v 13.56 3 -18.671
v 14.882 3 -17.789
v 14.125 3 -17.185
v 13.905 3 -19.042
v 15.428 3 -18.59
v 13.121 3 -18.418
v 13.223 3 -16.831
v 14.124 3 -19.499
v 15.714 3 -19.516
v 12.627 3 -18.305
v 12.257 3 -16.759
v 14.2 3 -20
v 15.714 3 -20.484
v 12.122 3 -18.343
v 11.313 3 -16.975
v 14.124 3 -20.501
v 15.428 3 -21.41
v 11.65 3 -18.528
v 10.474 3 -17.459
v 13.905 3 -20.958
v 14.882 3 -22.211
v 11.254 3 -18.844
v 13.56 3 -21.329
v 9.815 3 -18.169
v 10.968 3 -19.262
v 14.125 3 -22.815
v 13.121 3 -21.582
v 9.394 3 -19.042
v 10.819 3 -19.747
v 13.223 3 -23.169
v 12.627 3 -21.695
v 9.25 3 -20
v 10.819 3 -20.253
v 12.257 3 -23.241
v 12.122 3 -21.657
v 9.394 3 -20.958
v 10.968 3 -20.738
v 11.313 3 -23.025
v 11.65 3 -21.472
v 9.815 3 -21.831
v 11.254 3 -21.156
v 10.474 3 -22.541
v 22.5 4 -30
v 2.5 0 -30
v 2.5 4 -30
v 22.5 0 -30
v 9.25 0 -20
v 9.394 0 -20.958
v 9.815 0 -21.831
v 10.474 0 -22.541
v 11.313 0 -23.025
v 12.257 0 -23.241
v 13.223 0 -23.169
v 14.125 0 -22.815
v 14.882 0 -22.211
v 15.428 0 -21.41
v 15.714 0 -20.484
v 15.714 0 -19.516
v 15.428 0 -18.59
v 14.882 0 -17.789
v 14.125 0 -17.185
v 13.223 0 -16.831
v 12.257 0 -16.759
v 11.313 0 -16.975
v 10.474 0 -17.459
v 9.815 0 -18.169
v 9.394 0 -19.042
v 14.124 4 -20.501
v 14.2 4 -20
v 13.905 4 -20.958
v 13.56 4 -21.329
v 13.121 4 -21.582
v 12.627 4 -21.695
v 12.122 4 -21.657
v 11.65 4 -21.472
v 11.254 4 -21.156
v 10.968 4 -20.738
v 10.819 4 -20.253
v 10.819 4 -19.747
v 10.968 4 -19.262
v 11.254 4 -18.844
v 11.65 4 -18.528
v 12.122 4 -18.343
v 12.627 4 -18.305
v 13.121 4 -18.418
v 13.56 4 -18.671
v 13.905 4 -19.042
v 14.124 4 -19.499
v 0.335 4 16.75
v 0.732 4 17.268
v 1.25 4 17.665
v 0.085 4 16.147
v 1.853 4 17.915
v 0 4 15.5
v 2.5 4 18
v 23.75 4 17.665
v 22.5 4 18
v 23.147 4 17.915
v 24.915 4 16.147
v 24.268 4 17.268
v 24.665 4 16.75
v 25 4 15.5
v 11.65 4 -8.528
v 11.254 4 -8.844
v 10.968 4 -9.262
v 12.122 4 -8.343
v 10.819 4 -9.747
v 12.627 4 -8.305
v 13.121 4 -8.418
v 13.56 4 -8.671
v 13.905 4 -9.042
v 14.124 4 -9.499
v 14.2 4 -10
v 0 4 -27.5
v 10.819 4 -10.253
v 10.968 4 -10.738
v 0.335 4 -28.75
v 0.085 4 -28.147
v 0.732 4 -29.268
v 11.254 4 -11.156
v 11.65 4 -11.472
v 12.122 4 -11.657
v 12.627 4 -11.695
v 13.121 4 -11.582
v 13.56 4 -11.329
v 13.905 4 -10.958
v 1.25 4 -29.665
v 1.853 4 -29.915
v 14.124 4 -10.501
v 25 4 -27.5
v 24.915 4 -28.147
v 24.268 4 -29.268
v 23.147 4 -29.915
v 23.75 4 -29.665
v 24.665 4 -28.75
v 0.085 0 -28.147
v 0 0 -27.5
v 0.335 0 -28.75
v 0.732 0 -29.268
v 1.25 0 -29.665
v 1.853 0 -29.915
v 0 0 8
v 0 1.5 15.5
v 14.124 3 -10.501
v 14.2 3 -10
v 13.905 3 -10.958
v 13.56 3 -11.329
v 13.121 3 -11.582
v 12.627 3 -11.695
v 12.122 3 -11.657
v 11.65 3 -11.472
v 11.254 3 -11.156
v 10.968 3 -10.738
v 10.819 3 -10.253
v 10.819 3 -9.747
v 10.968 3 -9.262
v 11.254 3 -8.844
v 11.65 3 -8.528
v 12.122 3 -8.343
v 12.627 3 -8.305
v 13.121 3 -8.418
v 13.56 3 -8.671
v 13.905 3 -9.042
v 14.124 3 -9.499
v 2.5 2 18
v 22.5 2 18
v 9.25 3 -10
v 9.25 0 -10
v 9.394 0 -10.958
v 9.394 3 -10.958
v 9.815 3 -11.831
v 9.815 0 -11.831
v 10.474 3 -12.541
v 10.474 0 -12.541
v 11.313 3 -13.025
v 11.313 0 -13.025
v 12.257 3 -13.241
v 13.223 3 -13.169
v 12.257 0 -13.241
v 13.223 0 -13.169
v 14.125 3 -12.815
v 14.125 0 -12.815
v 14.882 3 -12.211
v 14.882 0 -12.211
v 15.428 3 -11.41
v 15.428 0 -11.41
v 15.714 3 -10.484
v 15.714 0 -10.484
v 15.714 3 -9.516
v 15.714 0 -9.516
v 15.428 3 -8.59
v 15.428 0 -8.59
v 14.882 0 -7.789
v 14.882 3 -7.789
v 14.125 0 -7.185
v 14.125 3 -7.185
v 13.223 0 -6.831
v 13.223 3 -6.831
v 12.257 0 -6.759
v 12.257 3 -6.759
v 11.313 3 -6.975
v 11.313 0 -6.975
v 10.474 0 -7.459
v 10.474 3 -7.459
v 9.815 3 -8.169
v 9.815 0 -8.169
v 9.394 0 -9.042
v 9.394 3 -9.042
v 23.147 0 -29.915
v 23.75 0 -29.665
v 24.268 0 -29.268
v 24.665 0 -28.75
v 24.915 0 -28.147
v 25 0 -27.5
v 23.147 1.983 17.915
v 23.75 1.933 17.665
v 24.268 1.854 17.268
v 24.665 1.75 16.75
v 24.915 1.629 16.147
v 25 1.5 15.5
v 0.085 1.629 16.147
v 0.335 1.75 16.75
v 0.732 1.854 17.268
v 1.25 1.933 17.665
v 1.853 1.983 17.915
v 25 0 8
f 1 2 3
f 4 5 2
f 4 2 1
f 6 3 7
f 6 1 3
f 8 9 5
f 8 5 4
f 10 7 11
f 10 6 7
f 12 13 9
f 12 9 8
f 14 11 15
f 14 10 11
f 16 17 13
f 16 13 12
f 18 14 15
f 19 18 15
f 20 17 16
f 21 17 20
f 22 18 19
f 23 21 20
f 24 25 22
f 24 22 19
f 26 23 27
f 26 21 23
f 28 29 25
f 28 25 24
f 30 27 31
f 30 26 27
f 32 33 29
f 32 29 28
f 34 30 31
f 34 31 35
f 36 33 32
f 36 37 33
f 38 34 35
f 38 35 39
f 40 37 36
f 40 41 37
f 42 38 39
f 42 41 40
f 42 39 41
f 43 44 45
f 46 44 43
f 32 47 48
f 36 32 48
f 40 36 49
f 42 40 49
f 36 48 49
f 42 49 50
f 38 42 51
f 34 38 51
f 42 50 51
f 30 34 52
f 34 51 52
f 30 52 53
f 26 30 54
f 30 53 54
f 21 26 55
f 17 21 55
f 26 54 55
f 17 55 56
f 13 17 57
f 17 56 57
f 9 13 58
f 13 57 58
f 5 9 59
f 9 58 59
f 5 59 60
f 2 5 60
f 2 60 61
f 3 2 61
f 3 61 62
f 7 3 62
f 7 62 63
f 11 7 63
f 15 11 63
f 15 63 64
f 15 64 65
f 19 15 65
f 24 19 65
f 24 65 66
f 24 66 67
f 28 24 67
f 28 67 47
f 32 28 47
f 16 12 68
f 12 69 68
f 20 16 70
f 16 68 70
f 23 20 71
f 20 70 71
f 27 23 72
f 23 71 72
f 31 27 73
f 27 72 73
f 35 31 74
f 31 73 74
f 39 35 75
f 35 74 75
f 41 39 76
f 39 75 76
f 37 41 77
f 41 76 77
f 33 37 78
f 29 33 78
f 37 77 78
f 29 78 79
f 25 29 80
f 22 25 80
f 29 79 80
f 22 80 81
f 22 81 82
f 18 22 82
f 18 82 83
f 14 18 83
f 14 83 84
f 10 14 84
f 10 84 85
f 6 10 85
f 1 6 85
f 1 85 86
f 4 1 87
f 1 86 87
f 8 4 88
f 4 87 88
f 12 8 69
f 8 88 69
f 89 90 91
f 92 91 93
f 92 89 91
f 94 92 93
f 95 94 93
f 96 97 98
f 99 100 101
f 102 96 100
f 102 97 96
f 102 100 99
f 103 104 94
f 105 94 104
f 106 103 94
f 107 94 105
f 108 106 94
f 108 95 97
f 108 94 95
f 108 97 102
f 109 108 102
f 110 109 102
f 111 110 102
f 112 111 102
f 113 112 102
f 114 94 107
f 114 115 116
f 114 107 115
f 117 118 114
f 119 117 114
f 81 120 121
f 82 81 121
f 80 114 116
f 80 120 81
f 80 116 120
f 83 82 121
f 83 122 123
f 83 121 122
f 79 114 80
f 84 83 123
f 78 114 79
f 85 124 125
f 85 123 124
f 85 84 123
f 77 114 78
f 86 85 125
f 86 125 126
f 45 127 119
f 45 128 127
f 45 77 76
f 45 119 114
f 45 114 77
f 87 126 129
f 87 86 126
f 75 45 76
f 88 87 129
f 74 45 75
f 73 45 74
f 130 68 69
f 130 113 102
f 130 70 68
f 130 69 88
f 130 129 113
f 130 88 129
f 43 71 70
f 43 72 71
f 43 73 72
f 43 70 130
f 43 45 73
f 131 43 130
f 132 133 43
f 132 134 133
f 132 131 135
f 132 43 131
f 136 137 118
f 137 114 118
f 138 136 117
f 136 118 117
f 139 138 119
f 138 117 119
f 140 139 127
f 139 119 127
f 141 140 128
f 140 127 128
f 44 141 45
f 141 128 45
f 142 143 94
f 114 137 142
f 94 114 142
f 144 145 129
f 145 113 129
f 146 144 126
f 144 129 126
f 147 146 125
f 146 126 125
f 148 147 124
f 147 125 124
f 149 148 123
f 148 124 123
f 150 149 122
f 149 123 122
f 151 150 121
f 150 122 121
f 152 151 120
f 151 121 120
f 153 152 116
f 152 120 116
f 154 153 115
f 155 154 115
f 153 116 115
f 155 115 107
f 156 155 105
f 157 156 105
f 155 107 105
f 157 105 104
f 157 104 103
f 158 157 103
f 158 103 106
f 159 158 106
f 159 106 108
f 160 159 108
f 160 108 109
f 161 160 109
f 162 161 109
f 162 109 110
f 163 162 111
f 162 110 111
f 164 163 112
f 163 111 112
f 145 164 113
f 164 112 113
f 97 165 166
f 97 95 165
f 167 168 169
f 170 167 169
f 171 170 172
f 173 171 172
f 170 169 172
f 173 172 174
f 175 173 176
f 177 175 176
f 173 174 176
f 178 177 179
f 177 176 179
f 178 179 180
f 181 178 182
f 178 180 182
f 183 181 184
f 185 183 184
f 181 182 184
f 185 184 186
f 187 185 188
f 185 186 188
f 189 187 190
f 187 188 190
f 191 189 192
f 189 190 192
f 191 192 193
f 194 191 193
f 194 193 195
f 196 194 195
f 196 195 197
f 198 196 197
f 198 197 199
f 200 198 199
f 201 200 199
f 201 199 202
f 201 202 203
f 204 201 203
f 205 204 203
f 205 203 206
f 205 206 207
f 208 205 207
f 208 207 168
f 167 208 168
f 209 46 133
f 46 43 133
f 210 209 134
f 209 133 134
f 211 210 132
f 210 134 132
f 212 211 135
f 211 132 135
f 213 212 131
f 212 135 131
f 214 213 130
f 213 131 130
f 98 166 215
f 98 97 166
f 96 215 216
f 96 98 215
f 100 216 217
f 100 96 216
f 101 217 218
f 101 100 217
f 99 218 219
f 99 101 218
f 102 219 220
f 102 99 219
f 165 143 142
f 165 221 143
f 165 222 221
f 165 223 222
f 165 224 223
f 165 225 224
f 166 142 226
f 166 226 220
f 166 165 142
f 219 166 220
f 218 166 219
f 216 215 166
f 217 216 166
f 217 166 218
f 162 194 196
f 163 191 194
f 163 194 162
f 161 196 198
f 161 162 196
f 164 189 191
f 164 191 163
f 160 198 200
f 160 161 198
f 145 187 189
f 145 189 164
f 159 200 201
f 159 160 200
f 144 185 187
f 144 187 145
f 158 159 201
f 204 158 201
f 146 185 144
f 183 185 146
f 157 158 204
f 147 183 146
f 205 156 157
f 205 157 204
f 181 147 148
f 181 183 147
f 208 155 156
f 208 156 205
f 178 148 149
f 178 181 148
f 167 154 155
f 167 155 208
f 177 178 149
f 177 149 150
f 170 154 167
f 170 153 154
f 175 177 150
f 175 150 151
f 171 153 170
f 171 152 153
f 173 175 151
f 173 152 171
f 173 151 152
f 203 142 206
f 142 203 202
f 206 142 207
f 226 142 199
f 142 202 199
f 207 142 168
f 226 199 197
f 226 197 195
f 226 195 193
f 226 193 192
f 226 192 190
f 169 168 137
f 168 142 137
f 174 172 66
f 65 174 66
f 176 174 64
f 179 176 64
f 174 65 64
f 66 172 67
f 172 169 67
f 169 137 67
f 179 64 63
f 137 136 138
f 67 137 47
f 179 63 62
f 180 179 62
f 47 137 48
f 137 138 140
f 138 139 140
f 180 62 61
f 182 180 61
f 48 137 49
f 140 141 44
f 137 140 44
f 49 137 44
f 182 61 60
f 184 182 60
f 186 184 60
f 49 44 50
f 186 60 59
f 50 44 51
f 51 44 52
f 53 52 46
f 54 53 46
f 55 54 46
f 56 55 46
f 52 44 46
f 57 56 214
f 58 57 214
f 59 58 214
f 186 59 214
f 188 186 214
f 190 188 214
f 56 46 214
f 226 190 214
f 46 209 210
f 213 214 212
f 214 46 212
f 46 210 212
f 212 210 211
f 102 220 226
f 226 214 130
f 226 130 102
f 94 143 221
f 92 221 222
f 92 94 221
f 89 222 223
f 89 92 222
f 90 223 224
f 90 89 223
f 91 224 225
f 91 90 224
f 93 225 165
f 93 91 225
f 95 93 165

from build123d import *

# Parameters (mm, degrees)
SKETCH1_W                      = 25
SKETCH1_H                      = 30
BOSS_EXTRUDE1_DEPTH            = 4
CBORE_FOR_M3_SHCS2_D           = 3.4
CBORE_FOR_M3_SHCS2_CBORE_D     = 6.5
CBORE_FOR_M3_SHCS2_CBORE_DEPTH = 3
SKETCH5_W                      = 25
SKETCH5_H                      = 4
BOSS_EXTRUDE2_DEPTH            = 18
CHAMFER1_SIZE                  = 10
CHAMFER1_SIZE2                 = 2
FILLET1_R                      = 2.5


with BuildPart() as part:
    # Sketch1 → Boss-Extrude1 (new body)
    with BuildSketch(Plane(origin=(0, 0, 0), x_dir=(1, 0, 0), z_dir=(0, 1, 0))):
        with Locations((12.5, 15)):
            Rectangle(SKETCH1_W, SKETCH1_H)
    extrude(amount=BOSS_EXTRUDE1_DEPTH)

    # CBORE for M3 SHCS2 (through all)
    with Locations(Plane(origin=(0, 0, 0), x_dir=(-1, 0, 0), z_dir=(0, -1, 0))):
        with Locations((-12.5, 20), (-12.5, 10)):
            CounterBoreHole(CBORE_FOR_M3_SHCS2_D / 2, CBORE_FOR_M3_SHCS2_CBORE_D / 2, CBORE_FOR_M3_SHCS2_CBORE_DEPTH)

    # Sketch5 → Boss-Extrude2 (add)
    with BuildSketch(Plane.XY):
        with Locations((12.5, 2)):
            Rectangle(SKETCH5_W, SKETCH5_H)
    extrude(amount=BOSS_EXTRUDE2_DEPTH)

    # Chamfer1
    chamfer1_edges = [part.edges().sort_by_distance(p)[0] for p in [
        (12.5, 0, 18),
    ]]
    chamfer1_side = [part.faces().sort_by_distance(p)[0] for p in [
        (12.5, 0, -5.473114445),
    ]]
    chamfer(chamfer1_edges, length=CHAMFER1_SIZE, length2=CHAMFER1_SIZE2, reference=chamfer1_side[0])

    # Fillet1
    fillet1_edges = [part.edges().sort_by_distance(p)[0] for p in [
        (0, 3, 18),
        (25, 3, 18),
        (0, 2, -30),
        (25, 2, -30),
    ]]
    fillet(fillet1_edges, radius=FILLET1_R)


solid = part.part
